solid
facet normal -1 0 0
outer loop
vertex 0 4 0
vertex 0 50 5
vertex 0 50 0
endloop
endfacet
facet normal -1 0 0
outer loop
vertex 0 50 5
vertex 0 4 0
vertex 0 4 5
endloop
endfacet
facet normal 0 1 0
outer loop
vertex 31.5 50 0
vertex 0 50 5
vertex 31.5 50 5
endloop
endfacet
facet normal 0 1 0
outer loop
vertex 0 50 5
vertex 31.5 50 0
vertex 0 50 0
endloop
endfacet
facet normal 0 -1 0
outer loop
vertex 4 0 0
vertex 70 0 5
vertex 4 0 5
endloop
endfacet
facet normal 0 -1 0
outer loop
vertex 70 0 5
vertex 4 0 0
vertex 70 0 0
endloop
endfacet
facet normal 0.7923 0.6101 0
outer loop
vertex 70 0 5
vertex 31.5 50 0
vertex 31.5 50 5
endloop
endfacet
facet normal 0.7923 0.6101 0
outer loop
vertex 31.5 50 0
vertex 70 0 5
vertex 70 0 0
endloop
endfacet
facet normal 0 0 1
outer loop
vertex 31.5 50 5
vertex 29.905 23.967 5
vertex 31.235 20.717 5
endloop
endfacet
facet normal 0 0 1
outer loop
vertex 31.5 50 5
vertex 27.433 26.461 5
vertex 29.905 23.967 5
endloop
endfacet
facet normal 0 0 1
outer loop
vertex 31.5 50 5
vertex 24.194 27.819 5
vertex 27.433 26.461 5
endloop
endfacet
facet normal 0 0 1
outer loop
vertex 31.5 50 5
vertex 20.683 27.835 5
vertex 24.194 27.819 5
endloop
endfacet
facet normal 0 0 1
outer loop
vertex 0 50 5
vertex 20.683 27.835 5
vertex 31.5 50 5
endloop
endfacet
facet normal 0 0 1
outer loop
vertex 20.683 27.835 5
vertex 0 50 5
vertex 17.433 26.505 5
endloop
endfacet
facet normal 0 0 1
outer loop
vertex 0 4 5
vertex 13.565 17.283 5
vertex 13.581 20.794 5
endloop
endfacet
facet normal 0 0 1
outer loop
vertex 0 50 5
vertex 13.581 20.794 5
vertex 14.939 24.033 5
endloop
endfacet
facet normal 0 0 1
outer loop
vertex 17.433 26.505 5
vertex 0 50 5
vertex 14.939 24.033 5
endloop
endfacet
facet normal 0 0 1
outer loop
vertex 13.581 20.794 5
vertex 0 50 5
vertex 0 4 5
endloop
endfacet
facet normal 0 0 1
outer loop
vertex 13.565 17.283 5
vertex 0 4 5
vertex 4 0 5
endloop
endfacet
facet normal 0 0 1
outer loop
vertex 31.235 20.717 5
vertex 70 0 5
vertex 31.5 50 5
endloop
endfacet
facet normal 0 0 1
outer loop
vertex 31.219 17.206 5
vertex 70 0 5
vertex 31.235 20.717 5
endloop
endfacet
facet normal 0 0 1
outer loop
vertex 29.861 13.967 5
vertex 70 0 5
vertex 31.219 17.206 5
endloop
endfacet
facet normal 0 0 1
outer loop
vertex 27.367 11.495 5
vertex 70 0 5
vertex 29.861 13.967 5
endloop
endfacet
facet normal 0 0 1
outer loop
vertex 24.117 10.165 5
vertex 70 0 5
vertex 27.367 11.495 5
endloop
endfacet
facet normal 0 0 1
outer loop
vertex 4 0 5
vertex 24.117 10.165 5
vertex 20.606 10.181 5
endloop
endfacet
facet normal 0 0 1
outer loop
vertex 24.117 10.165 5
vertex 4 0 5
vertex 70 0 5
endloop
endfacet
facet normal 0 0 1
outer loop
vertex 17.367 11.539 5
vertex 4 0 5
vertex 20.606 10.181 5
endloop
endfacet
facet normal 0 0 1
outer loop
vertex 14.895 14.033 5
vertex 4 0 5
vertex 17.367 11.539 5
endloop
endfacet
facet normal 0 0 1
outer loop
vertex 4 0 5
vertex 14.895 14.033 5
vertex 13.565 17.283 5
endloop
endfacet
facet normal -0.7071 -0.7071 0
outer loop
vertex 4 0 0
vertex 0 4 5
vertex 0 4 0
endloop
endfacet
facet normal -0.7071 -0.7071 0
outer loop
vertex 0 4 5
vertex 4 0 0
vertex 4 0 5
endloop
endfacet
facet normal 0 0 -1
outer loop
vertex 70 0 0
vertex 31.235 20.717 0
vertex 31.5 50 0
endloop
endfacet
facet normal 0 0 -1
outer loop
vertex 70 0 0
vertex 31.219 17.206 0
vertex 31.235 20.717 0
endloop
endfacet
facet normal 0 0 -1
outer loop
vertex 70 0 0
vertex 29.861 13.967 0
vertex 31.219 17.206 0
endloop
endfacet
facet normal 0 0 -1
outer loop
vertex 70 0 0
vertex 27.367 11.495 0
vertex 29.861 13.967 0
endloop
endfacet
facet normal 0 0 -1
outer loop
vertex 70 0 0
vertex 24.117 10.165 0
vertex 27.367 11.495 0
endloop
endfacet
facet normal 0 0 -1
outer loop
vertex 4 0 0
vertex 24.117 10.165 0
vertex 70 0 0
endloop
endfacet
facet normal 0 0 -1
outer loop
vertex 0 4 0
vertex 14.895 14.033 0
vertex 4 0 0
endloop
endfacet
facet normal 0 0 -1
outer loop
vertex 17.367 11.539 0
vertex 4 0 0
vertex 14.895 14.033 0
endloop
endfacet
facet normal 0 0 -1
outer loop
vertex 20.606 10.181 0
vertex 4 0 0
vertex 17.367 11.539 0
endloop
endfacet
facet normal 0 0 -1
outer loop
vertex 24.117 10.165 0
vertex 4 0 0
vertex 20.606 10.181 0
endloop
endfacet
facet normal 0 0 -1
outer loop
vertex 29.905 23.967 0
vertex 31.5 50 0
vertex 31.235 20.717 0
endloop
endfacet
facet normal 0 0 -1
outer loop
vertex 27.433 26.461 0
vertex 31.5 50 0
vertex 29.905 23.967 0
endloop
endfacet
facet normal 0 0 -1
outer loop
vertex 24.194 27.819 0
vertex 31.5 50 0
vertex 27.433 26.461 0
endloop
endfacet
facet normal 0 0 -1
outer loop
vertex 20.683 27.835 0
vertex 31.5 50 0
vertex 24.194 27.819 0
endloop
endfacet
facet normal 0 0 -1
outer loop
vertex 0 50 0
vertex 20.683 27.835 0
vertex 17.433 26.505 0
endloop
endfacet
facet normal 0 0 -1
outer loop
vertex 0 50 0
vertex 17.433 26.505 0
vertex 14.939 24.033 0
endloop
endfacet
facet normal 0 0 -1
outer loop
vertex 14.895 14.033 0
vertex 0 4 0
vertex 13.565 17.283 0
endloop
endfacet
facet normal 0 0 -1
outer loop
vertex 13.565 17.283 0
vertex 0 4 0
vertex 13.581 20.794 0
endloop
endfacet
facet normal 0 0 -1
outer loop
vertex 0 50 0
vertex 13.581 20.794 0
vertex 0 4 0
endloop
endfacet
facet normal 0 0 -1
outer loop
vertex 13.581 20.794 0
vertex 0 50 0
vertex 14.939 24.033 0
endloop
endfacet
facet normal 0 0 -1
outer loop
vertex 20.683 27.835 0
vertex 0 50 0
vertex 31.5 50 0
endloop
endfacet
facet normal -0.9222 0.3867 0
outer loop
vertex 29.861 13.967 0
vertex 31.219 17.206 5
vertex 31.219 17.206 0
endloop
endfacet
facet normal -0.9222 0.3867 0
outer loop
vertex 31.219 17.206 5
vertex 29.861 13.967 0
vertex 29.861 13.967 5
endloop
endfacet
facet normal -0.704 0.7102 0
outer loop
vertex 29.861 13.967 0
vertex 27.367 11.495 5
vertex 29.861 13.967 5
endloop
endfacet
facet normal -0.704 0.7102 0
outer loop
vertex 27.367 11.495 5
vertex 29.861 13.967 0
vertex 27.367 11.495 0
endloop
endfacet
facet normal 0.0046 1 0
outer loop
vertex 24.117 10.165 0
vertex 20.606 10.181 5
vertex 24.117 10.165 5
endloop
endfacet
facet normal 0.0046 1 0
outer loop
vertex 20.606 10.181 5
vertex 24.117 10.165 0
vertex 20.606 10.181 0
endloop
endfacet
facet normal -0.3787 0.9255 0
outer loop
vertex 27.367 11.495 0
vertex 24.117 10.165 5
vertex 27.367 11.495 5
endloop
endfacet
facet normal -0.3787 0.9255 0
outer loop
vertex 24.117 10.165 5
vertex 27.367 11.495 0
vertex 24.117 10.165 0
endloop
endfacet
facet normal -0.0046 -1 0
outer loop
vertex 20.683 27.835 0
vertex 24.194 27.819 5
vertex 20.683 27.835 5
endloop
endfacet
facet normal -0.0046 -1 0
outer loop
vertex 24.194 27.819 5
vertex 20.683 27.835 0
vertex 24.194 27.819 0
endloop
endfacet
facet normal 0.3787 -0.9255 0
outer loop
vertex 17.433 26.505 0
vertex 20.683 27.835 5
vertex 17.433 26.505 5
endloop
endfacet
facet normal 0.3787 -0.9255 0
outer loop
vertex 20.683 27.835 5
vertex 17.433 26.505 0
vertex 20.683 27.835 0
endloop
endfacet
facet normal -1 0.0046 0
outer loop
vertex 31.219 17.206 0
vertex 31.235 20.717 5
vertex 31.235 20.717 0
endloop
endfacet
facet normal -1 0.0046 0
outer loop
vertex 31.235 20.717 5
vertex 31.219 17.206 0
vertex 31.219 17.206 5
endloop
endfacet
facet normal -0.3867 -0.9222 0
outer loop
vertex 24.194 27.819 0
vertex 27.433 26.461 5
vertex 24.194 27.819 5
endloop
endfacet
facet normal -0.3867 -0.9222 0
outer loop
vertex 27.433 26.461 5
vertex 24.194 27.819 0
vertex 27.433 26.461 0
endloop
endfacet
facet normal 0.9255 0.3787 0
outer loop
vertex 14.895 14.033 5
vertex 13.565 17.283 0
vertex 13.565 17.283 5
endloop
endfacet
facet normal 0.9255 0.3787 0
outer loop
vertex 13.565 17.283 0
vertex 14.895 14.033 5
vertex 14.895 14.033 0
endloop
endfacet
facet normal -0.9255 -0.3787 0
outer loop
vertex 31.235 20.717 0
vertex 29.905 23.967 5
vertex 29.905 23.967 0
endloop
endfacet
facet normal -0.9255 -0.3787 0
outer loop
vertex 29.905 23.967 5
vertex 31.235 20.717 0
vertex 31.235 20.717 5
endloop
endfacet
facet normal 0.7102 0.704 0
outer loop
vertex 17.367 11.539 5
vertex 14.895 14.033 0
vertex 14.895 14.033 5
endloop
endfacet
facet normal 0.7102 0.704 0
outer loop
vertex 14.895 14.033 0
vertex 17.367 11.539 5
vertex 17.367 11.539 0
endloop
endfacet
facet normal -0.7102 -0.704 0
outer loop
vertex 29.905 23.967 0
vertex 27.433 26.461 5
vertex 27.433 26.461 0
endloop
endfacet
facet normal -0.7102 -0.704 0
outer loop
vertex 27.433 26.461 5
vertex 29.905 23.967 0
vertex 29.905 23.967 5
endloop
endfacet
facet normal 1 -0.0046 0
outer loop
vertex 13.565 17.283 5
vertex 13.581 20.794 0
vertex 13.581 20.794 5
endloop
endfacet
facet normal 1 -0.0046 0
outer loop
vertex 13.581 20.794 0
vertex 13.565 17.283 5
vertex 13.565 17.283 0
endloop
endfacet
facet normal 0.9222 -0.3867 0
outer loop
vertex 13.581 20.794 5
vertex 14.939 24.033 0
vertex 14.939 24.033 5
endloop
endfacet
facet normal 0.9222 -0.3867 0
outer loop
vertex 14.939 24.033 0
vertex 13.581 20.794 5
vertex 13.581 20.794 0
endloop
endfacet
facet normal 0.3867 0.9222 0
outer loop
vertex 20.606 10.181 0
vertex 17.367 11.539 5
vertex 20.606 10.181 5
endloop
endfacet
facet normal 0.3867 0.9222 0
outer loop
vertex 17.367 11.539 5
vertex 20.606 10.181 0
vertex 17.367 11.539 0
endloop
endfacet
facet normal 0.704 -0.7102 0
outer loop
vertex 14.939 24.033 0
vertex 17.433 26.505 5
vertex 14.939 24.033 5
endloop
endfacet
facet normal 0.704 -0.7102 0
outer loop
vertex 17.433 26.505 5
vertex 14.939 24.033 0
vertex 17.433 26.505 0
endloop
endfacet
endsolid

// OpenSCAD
$fn = 32;

// ----------------------------------------------------------------------
// Bracket plate: gusset 70 x 50
// ----------------------------------------------------------------------

// --- parameters (mm) ---
hole_r = 3.5;             // bolt hole radius
plate_t = 5;              // plate thickness, Z (extrusion height)
gus_a = 70;               // base length
gus_b = 50;               // height
top_x = 31.5;             // top edge X of the angled cut
light_r = 9;              // lightening hole radius

light_d = 2 * light_r;

profile = [[4, 0], [35, 0], [70, 0], [31.5, 50], [0, 50], [0, 4]];  // primary outline, 6 points, counter clockwise
void_1 = [[31.235, 20.717], [29.905, 23.967], [27.433, 26.461], [24.194, 27.819], [20.683, 27.835], [17.433, 26.505], [14.939, 24.033], [13.581, 20.794], [13.565, 17.283], [14.895, 14.033], [17.367, 11.539], [20.606, 10.181], [24.117, 10.165], [27.367, 11.495], [29.861, 13.967], [31.219, 17.206]];  // lightening hole, 16 points

// --- the one profile operation ---
difference() {
  linear_extrude(height = plate_t) polygon(points = profile);
  translate([0, 0, -1])
    linear_extrude(height = plate_t + 2) polygon(points = void_1);
}
